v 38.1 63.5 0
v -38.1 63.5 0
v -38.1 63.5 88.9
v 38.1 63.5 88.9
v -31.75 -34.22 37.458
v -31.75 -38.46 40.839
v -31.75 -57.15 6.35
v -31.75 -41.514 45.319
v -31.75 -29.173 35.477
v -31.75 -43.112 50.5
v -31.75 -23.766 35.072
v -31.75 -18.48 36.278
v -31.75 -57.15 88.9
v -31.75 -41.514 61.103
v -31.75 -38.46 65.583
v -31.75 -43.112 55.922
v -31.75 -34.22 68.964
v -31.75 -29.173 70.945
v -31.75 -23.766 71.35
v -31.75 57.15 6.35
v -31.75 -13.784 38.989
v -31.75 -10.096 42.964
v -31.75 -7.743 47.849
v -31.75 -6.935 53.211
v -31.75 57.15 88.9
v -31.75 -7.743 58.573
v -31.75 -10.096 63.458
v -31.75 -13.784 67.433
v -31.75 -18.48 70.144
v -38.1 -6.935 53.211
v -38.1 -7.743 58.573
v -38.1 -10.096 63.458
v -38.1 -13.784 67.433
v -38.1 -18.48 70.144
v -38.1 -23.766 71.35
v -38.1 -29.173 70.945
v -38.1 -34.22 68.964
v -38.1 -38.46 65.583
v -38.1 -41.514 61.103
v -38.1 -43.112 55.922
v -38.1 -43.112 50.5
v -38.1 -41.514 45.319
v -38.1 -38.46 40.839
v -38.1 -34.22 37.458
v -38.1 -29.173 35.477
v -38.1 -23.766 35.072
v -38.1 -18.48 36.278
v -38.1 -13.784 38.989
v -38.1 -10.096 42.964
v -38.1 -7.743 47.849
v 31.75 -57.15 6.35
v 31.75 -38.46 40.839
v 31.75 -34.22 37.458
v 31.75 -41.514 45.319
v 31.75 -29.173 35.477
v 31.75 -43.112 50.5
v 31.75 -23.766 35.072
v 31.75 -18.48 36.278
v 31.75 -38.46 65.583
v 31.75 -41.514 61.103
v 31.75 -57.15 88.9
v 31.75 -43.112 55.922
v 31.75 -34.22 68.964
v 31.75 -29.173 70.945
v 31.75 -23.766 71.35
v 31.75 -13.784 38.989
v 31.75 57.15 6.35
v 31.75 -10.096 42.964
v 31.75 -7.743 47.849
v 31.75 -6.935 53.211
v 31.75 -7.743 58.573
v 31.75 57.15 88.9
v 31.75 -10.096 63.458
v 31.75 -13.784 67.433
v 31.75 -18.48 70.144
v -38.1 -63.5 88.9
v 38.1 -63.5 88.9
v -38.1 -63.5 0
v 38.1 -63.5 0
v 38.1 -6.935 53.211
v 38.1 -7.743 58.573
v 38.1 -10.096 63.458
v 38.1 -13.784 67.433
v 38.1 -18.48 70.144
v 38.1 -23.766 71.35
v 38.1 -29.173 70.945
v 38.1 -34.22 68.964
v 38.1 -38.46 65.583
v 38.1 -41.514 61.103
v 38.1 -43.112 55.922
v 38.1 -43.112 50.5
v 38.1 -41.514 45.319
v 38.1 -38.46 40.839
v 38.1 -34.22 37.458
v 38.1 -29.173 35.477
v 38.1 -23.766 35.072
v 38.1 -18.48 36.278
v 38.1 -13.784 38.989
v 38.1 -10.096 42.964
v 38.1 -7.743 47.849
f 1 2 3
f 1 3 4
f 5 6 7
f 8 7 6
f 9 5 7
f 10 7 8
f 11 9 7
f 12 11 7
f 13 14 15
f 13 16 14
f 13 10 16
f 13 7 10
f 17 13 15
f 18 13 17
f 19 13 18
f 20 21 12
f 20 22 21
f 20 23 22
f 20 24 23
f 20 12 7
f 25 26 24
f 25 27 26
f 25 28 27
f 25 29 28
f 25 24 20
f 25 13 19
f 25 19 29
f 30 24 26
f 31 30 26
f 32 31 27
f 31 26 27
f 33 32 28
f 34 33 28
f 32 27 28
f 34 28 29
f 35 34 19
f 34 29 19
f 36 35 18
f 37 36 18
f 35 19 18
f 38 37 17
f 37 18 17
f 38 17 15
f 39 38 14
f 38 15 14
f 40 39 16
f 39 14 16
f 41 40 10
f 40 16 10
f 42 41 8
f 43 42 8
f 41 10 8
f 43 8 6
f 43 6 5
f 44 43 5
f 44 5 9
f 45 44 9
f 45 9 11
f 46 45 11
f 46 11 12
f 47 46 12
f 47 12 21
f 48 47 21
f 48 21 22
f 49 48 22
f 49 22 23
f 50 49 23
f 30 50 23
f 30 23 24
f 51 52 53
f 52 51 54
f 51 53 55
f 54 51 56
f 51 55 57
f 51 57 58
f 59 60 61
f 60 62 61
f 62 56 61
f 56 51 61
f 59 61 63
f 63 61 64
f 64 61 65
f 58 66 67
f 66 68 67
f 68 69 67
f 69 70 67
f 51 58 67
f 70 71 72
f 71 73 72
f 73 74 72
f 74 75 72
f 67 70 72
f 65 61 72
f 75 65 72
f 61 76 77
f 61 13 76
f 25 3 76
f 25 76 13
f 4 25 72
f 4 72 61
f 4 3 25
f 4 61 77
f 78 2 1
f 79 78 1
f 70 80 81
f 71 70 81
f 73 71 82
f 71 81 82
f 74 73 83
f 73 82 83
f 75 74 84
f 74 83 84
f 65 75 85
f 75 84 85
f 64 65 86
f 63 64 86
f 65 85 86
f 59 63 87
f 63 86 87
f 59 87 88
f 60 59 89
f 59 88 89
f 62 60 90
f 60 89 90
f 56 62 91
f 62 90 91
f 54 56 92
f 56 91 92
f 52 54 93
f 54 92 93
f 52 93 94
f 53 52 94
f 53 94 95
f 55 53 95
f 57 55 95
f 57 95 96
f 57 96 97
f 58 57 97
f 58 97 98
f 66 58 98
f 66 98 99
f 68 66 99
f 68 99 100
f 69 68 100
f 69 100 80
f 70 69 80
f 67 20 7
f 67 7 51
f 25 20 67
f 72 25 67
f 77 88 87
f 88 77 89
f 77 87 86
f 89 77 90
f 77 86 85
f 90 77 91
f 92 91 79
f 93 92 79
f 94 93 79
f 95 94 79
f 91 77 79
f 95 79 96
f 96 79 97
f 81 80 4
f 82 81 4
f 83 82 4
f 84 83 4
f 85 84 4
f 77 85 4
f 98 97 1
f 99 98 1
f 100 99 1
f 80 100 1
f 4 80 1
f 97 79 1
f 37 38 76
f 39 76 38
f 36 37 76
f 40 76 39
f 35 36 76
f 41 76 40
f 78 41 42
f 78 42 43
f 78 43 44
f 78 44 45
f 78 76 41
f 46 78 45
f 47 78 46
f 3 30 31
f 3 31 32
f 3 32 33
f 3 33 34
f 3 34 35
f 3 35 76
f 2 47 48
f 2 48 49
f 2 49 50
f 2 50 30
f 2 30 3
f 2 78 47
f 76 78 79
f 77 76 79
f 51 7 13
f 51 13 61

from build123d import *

# Parameters (mm, degrees)
F0_W     = 76.2
F0_H     = 127
F1_DEPTH = 88.9
F2_W     = 63.5
F2_H     = 114.3
F3_DEPTH = 82.55
F4_R     = 18.190192
F5_DEPTH = 76.201


with BuildPart() as f1:
    # F0 (on Top) → F1 (new body)
    with BuildSketch(Plane.XY):
        Rectangle(F0_W, F0_H)
    extrude(amount=F1_DEPTH)

    # F2 (on face) → F3 (cut)
    with BuildSketch(Plane.XY.offset(88.9)):
        Rectangle(F2_W, F2_H)
    extrude(amount=-F3_DEPTH, mode=Mode.SUBTRACT)

    # F4 (on face) → F5 (cut, through all)
    with BuildSketch(Plane.YZ.offset(38.1)):
        with Locations((-25.125185, 53.211018)):
            Circle(F4_R)
    extrude(amount=-F5_DEPTH, mode=Mode.SUBTRACT)


solid = f1.part
